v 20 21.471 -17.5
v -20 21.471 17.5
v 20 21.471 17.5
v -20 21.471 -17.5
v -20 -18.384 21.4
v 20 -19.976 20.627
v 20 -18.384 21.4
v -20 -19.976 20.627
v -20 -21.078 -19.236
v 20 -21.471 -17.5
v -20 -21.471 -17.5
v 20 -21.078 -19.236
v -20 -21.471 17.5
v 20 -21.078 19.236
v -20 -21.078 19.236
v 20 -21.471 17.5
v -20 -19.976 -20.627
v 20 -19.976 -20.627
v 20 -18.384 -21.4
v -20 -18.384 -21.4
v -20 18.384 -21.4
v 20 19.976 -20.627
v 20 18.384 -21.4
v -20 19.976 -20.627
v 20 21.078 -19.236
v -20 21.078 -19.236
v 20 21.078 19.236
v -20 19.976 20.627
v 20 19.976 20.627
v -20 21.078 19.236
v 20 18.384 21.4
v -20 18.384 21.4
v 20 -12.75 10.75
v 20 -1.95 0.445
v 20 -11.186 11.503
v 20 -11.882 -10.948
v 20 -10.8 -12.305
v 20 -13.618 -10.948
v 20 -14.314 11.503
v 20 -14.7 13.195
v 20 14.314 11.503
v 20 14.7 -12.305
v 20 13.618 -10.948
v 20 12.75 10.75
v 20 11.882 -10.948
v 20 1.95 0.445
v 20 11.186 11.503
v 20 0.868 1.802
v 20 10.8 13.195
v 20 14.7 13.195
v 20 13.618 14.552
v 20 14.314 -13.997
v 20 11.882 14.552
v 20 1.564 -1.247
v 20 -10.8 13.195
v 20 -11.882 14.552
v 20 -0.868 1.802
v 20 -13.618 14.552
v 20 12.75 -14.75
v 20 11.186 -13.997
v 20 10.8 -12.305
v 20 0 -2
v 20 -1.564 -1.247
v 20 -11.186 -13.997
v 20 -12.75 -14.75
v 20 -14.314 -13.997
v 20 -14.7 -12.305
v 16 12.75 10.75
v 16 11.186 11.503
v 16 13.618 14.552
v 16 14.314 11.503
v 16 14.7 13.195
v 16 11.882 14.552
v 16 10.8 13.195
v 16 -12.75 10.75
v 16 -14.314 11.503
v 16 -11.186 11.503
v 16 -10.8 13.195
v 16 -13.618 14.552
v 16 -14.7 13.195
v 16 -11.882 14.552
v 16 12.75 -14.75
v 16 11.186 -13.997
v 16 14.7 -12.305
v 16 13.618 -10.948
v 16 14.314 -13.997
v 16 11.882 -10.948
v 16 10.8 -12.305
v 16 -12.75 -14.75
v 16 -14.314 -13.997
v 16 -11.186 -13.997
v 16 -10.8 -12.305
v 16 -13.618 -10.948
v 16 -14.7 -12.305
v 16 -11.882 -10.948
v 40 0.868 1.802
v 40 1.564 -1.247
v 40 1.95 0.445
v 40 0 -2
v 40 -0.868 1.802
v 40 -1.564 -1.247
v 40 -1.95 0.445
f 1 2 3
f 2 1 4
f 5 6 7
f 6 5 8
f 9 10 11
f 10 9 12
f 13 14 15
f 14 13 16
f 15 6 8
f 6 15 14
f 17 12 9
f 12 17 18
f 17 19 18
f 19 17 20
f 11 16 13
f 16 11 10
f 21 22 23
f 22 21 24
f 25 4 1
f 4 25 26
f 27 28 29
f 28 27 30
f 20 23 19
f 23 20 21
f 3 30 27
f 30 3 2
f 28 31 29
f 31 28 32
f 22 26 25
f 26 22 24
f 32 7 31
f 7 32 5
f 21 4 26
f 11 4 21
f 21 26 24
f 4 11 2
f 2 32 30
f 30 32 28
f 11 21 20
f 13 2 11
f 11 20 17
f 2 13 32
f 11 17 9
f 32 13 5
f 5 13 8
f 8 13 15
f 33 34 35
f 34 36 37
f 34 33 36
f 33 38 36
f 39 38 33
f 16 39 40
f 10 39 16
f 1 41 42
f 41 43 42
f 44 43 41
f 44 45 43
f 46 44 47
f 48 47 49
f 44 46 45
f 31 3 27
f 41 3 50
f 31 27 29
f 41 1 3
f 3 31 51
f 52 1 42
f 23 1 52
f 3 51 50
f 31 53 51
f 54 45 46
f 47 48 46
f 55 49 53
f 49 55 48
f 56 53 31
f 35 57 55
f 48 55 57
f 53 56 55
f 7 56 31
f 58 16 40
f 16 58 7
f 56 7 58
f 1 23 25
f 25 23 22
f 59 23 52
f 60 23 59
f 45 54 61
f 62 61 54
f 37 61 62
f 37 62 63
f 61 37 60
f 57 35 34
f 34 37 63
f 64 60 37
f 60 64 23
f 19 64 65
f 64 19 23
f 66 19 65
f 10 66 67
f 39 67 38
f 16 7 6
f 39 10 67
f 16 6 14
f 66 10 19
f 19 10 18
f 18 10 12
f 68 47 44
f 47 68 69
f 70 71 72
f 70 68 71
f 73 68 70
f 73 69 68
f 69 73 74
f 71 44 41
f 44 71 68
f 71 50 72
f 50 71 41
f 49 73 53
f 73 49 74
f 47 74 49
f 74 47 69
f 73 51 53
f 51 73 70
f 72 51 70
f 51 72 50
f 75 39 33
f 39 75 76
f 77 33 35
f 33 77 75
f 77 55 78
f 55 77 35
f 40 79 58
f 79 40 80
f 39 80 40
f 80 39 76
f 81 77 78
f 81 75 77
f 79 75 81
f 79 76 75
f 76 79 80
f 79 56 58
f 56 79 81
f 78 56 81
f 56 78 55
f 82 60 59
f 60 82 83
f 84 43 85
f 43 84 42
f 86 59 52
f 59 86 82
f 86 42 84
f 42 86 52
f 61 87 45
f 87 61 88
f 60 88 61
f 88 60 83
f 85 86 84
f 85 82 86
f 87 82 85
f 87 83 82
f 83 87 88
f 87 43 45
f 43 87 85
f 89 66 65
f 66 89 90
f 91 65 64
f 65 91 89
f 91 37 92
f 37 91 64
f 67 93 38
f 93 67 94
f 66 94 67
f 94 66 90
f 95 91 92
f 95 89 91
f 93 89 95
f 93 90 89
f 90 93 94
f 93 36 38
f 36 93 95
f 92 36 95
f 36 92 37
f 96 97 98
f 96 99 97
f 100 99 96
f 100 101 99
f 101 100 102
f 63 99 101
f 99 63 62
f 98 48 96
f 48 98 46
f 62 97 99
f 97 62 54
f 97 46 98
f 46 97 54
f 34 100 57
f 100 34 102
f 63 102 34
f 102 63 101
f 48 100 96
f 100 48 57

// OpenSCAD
module motor()
{

    difference()
    {
        color("#222") minkowski()
        {
            cube([ 50, 35, 35 ], center = true);
            sphere(r = 4);
        }
        color("#ddd") translate(v = [ -45, 0, 0 ]) cube(size = 50, center = true);
        color("#ddd") translate(v = [ 45, 0, 0 ]) cube(size = 50, center = true);
        screw_offset = 25.5/2;
        translate(v = [16, screw_offset, screw_offset]) rotate(90, [0, 1, 0]) cylinder(h = 10, r = 2);
        translate(v = [16, -screw_offset, screw_offset]) rotate(90, [0, 1, 0]) cylinder(h = 10, r = 2);
        translate(v = [16, screw_offset, -screw_offset]) rotate(90, [0, 1, 0]) cylinder(h = 10, r = 2);
        translate(v = [16, -screw_offset, -screw_offset]) rotate(90, [0, 1, 0]) cylinder(h = 10, r = 2);
    }
    color("#eee") translate(v = [ 0, 0, 0 ]) rotate(90, [0, 1, 0]) cylinder(h = 40, r = 2);
}

motor();
